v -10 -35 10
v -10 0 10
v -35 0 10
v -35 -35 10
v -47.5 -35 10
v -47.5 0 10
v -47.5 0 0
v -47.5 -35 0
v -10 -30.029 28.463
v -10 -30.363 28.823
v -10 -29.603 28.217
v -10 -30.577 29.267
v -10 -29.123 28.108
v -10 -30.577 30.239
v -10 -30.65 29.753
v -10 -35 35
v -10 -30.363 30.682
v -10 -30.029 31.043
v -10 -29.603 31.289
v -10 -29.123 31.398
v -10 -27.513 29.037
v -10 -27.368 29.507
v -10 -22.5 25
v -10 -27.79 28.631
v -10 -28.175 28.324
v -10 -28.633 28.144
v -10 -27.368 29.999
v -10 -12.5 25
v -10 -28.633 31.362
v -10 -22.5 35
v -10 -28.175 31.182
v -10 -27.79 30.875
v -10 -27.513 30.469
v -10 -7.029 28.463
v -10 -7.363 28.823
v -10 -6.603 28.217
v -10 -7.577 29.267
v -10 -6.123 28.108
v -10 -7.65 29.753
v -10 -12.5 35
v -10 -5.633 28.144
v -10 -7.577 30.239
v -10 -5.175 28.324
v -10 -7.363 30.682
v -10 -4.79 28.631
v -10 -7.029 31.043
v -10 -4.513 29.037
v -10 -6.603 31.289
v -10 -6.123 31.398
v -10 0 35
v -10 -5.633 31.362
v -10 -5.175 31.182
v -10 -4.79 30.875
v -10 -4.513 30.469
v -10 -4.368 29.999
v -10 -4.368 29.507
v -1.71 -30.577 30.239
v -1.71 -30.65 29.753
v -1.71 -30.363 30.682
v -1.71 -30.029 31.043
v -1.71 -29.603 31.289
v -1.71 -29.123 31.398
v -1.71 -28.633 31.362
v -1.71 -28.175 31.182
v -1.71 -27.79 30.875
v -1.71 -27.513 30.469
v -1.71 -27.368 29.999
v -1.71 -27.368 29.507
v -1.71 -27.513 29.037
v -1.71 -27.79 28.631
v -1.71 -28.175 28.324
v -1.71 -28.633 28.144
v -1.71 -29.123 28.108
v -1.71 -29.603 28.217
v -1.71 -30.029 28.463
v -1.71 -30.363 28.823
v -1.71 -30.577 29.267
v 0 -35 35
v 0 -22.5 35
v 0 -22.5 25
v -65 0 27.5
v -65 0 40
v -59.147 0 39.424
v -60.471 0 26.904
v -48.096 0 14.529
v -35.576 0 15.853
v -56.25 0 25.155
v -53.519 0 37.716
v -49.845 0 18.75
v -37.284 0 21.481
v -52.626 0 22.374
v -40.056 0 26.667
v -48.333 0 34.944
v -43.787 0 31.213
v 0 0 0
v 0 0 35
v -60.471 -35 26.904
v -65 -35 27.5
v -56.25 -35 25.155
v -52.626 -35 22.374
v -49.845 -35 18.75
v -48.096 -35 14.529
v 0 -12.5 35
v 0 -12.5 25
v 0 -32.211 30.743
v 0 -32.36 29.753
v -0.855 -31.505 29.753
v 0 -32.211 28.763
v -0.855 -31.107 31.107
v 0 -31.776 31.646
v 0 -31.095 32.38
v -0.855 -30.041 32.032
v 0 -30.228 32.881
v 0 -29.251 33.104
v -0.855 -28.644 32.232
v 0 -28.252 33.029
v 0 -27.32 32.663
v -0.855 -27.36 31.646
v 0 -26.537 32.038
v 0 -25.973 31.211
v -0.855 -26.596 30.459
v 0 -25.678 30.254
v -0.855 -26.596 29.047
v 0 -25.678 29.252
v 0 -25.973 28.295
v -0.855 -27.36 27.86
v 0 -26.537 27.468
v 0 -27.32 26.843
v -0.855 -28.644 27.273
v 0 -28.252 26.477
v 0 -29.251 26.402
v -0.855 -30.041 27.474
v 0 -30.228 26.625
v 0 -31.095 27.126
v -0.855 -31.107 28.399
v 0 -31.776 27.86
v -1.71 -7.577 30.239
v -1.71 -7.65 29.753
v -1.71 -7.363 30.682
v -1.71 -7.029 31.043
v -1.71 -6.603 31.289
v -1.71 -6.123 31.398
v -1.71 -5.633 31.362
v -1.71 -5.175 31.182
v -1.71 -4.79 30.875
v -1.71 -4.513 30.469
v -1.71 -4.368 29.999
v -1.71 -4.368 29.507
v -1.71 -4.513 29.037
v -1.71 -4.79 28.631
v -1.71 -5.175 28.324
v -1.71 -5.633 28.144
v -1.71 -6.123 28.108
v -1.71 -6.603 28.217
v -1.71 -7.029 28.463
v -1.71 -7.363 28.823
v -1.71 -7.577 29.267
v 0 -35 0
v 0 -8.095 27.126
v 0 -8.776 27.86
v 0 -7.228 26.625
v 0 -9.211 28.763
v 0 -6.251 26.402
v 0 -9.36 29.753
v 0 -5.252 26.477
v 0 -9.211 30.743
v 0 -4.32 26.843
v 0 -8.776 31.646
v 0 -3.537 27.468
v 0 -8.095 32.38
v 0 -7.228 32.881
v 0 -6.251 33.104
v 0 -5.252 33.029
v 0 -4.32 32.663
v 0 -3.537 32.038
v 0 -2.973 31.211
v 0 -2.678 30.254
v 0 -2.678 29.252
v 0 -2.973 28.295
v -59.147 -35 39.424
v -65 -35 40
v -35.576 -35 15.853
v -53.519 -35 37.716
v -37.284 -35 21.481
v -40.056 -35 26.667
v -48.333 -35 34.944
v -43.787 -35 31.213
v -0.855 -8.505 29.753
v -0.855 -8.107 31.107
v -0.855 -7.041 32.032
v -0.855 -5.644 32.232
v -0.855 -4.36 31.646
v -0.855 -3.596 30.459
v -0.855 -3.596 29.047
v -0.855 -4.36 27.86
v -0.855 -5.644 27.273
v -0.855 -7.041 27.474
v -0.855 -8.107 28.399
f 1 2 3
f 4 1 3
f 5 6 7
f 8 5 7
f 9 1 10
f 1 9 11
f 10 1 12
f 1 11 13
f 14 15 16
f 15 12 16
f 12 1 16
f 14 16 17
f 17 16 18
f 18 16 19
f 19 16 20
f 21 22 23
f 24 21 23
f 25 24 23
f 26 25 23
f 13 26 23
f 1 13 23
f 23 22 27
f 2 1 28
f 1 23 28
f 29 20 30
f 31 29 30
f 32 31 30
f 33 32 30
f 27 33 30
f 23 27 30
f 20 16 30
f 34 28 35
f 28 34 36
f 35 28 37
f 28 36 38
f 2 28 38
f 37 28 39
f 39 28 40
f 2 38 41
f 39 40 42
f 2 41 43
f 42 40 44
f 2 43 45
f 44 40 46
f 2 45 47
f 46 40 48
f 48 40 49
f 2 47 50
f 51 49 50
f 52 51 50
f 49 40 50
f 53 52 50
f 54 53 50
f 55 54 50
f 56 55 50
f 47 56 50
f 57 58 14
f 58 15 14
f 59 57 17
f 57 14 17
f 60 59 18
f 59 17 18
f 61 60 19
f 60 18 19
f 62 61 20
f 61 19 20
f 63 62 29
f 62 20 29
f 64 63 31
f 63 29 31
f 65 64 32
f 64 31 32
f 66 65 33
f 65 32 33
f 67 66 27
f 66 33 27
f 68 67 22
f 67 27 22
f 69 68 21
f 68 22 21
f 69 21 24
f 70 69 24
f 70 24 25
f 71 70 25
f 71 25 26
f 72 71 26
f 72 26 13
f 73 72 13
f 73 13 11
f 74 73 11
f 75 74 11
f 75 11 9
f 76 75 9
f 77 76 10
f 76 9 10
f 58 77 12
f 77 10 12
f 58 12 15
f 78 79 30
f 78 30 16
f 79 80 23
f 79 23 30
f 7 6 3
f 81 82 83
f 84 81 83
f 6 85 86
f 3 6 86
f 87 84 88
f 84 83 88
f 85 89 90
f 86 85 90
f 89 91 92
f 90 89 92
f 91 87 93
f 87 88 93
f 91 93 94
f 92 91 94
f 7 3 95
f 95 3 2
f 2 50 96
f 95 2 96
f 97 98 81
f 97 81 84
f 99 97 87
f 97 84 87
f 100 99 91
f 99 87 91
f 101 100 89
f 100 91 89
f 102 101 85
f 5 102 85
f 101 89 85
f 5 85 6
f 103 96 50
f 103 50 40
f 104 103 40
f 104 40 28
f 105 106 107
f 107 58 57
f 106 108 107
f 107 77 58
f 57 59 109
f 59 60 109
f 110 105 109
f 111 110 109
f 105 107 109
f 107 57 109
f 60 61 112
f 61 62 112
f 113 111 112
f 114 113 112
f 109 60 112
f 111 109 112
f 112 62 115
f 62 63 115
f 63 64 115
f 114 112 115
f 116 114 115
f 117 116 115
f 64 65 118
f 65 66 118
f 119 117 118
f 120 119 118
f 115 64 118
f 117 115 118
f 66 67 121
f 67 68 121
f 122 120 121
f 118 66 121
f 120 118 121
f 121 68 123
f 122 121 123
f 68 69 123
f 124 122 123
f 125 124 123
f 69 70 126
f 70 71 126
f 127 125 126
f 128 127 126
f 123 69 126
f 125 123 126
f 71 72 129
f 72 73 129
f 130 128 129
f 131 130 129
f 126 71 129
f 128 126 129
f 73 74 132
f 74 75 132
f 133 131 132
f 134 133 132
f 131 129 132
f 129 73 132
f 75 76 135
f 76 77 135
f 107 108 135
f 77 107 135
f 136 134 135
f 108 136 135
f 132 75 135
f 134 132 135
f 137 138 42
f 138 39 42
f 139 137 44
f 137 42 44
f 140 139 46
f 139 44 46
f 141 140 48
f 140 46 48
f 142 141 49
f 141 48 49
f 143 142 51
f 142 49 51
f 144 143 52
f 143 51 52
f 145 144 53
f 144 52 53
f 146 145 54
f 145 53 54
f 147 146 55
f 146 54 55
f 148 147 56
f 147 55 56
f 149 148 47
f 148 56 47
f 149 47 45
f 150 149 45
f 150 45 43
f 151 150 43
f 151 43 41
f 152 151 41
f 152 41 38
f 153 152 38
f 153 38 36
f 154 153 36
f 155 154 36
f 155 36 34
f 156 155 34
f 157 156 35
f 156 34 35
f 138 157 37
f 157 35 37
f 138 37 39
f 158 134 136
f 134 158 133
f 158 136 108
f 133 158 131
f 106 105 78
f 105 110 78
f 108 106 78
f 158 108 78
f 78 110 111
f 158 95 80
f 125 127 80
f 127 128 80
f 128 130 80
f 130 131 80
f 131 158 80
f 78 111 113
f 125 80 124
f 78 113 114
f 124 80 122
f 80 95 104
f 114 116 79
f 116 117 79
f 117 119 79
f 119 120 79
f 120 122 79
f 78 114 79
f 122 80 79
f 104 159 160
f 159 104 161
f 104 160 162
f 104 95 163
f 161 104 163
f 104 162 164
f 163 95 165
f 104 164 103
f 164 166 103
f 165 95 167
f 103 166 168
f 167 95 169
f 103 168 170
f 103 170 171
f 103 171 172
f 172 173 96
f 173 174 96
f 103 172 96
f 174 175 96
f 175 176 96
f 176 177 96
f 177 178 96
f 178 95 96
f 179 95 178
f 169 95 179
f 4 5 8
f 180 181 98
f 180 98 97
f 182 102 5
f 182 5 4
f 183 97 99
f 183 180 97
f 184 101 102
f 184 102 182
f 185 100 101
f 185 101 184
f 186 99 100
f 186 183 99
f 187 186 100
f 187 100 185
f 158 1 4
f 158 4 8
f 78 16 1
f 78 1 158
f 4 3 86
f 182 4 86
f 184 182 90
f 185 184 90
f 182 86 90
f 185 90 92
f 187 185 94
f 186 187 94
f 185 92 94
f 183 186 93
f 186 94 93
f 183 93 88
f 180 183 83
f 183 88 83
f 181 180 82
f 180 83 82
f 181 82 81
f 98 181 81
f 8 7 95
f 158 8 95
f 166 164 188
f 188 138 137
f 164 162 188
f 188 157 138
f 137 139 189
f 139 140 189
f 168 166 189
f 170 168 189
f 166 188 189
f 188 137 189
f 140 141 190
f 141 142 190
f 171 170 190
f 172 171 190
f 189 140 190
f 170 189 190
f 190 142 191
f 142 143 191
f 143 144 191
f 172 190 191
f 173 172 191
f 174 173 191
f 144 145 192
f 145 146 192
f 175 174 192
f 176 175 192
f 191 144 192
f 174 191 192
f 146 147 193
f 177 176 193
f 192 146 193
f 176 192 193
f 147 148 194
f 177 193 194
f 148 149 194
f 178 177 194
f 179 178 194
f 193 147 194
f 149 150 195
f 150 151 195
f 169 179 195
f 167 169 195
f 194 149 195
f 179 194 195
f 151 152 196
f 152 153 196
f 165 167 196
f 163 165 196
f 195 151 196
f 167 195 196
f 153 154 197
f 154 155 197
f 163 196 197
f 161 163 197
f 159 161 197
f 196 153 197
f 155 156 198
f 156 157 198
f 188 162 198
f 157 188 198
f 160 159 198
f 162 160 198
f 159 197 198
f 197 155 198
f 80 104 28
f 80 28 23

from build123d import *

# Parameters (mm, degrees)
F1_DEPTH       = 35
F3_DEPTH       = 10
F4_D           = 3.3
F4_DEPTH       = 13.5
F4_CSINK_D     = 6.72
F4_CSINK_ANGLE = 90
F4_TIP         = 0.9914200214


with BuildPart() as f1:
    # F0 (on Front) → F1 (new body)
    with BuildSketch(Plane.XZ):
        with BuildLine():
            Line((-36.7157287525, 0), (0, 0))
            Line((0, 0), (0, 10))
            Line((0, 10), (-35, 10))
            ThreePointArc((-35, 10), (-35.4320432104, 4.9269406382), (-36.7157287525, 0))
        make_face()
        with BuildLine():
            Line((-47.5, 0), (-36.7157287525, 0))
            ThreePointArc((-36.7157287525, 0), (-35.4320432104, 4.9269406382), (-35, 10))
            Line((-35, 10), (-47.5, 10))
            Line((-47.5, 10), (-47.5, 0))
        make_face()
        with BuildLine():
            ThreePointArc((-35, 10), (-43.7867965644, 31.2132034356), (-65, 40))
            Line((-65, 40), (-65, 27.5))
            ThreePointArc((-65, 27.5), (-52.6256313292, 22.3743686708), (-47.5, 10))
            Line((-47.5, 10), (-35, 10))
        make_face()
    extrude(amount=F1_DEPTH)

    # F2 (on Right) → F3 (join)
    with BuildSketch(Plane.YZ):
        Polygon((-35, 0), (0, 0), (0, 35), (-12.5, 35), (-12.5, 25), (-22.5, 25), (-22.5, 35), (-35, 35), align=None)
    extrude(amount=-F3_DEPTH)

    # F4
    with Locations(Plane.YZ):
        with Locations((-29, 29.7529604286), (-6, 29.7529604286)):
            CounterSinkHole(F4_D / 2, F4_CSINK_D / 2, depth=F4_DEPTH, counter_sink_angle=F4_CSINK_ANGLE)
            with Locations((0, 0, -(F4_DEPTH + F4_TIP / 2))):  # 118° drill point
                Cone(0, F4_D / 2, F4_TIP, mode=Mode.SUBTRACT)


solid = f1.part
